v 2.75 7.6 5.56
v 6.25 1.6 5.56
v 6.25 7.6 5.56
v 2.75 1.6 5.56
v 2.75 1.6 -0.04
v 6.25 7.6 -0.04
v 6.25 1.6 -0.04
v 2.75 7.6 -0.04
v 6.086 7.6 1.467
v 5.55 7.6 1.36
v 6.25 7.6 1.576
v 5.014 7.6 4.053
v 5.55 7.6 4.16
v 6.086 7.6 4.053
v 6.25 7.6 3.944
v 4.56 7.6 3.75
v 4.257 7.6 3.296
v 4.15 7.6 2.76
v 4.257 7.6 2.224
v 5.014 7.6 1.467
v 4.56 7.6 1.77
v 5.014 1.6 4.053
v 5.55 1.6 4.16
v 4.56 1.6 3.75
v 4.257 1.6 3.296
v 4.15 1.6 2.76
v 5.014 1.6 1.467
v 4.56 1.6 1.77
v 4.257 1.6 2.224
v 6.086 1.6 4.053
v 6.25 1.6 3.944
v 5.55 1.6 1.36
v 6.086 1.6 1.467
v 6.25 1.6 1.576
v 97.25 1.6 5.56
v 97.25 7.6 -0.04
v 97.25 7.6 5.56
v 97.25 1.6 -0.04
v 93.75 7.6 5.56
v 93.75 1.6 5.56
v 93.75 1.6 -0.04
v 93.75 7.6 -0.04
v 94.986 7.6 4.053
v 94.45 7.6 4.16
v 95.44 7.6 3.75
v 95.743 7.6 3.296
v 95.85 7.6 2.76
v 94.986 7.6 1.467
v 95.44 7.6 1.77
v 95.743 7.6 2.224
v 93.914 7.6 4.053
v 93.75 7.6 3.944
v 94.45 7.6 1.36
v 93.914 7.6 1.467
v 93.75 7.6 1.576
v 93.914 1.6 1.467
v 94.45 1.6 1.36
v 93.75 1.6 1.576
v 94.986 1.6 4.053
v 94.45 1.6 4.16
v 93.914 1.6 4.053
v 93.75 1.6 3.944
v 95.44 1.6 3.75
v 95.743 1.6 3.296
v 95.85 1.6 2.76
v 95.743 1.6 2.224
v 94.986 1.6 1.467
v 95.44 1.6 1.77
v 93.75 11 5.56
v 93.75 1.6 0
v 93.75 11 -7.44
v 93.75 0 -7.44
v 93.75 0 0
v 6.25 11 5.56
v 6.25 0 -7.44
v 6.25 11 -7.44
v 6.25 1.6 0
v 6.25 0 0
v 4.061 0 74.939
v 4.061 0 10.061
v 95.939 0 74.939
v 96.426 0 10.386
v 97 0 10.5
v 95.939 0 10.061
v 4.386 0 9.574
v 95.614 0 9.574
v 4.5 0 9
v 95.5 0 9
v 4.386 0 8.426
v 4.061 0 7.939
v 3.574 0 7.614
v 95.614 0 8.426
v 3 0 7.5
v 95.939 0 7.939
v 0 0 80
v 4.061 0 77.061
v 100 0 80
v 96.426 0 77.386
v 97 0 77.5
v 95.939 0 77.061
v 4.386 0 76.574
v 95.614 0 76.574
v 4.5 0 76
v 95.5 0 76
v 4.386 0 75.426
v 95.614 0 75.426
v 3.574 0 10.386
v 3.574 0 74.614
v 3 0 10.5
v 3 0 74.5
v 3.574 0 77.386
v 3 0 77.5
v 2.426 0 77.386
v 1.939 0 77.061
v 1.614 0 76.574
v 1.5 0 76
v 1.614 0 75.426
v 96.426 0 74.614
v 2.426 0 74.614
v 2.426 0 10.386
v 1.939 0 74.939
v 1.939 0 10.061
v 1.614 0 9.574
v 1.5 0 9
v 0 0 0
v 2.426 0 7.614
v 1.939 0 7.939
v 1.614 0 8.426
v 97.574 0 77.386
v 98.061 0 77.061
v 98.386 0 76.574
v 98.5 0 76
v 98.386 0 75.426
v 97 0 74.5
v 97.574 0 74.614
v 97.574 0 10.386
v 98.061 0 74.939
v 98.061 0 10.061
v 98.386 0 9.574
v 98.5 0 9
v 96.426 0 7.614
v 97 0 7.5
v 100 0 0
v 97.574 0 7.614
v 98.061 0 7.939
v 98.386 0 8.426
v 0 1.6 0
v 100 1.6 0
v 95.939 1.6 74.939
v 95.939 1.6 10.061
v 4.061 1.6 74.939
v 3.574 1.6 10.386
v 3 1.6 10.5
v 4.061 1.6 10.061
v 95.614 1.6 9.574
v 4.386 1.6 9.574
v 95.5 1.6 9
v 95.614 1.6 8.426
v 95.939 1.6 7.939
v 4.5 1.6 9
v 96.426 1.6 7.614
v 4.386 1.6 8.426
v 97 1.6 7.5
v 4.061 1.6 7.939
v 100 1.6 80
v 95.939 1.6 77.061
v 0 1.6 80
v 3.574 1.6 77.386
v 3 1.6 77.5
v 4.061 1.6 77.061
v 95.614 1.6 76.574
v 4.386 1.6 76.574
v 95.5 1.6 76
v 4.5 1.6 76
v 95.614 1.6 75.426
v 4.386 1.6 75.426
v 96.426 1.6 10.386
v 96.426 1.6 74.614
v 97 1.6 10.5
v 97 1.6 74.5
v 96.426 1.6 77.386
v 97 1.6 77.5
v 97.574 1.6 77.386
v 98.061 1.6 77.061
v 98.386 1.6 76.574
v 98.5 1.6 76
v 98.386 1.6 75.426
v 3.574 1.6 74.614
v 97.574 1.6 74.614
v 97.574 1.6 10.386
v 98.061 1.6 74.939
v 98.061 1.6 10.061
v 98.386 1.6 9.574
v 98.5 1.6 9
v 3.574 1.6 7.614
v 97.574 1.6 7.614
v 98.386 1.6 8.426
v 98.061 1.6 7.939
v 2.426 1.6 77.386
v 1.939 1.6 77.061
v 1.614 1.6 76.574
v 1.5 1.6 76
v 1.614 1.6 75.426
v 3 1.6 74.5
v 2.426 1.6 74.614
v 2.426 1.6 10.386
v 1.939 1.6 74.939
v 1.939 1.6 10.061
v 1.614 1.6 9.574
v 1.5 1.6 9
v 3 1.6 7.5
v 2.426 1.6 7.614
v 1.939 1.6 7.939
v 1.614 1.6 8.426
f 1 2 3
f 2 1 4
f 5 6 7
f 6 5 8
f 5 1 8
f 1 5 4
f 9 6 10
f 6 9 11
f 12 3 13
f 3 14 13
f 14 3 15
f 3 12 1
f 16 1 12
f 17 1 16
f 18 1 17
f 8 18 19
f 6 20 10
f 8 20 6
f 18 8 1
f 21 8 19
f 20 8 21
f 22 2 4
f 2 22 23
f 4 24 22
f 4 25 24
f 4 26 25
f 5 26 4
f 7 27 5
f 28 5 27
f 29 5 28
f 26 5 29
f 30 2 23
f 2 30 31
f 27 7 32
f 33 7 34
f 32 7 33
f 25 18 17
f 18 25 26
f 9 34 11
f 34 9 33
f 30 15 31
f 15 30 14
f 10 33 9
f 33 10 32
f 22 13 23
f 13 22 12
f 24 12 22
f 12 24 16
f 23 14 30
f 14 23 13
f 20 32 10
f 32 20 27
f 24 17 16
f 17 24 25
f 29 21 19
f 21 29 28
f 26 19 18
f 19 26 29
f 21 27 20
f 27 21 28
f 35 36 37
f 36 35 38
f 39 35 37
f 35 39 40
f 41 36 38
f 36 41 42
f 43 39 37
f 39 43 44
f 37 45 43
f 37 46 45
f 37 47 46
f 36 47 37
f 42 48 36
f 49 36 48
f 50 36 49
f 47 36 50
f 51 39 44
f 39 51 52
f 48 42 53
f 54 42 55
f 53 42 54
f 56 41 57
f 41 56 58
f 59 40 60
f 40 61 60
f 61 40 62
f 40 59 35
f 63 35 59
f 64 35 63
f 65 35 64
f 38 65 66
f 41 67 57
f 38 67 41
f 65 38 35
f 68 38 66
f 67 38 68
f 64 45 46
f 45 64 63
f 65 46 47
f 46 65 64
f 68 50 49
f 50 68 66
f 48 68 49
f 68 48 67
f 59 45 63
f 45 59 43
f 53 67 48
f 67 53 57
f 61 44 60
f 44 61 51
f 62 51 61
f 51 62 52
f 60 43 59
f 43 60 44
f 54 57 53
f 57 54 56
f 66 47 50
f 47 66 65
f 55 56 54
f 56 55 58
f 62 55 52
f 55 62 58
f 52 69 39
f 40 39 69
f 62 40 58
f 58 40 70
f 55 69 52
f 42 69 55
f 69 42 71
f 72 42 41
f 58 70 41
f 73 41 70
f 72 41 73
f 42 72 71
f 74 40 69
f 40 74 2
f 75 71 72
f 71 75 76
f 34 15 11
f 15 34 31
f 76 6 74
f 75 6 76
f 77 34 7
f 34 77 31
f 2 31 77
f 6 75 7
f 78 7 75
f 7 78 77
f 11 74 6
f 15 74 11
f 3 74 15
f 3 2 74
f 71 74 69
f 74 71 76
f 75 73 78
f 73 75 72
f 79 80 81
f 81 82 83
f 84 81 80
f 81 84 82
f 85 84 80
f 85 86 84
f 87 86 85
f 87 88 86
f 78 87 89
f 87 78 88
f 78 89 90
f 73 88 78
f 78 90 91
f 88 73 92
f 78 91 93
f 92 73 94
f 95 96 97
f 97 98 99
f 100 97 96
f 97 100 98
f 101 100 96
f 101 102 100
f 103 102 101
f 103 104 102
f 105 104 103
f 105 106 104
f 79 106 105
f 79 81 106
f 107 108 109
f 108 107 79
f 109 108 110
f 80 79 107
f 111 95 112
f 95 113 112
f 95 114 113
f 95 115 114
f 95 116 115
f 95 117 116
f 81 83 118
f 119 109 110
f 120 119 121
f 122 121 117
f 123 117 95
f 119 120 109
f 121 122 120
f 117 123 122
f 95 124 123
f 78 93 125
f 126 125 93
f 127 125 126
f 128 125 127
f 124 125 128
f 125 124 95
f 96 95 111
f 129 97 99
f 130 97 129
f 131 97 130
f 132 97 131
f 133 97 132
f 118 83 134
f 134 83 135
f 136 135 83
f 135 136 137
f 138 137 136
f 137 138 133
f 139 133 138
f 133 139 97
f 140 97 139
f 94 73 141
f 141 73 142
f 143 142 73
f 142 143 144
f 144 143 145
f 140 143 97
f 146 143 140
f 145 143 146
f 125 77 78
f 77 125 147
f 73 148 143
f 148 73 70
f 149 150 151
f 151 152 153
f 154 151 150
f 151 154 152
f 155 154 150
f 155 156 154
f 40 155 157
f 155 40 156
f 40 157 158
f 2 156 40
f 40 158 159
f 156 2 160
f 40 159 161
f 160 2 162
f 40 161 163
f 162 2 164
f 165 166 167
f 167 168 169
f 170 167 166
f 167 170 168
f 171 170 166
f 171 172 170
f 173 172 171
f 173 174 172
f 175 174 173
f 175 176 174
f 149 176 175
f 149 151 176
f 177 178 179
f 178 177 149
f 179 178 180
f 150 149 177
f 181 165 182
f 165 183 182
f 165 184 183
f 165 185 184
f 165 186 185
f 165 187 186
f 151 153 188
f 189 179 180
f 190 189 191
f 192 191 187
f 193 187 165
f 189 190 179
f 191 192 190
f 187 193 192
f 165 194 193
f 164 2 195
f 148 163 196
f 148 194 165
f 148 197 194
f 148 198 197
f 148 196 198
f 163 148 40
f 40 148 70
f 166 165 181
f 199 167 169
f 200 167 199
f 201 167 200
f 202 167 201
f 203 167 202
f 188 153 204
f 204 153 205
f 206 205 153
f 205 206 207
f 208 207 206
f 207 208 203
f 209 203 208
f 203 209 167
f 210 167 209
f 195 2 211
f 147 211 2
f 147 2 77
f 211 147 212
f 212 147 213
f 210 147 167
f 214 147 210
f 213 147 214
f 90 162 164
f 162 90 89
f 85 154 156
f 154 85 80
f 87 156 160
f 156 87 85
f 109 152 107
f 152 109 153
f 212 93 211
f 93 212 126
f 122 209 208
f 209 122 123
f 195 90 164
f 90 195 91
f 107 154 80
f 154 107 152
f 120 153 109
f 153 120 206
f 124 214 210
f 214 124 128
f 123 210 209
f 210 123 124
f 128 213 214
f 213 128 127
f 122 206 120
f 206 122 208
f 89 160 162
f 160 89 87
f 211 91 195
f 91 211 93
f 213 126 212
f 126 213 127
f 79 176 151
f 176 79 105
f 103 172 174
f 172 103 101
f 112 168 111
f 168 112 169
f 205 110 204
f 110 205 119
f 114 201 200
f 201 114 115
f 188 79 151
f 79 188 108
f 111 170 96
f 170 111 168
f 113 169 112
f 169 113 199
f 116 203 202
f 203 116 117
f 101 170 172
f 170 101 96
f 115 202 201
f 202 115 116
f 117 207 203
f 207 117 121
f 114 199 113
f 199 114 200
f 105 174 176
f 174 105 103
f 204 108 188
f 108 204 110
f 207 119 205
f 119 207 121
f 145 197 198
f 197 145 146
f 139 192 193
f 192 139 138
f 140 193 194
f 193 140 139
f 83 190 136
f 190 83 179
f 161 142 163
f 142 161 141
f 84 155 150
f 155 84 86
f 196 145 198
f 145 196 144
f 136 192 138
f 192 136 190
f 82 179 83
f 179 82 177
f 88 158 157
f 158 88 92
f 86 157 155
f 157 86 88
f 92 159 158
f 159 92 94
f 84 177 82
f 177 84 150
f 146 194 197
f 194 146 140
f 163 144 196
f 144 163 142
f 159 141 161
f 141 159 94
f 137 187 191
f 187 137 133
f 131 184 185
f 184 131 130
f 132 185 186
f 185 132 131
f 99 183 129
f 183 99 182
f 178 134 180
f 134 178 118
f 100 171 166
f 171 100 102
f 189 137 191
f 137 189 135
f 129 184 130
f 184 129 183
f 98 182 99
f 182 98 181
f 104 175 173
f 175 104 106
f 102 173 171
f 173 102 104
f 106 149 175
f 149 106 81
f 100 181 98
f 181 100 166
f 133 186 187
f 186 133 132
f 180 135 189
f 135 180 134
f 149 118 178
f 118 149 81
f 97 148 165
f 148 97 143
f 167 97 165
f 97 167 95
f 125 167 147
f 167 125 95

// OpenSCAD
// file: ../library/linurs_screw_dim.scad
// Metric screws and nuts 
// urs@linurs.org 2015

// contains dimensions of linurs_screw and can be included in other 
// OpenScad files 


// Consistent parameters in this file
// d screw diameter M2_5, M3, ... (enumeration with screw_d)
// t millimeters added to diameters 
//   For the screw, head, nut = 0. 
//   For the piece where the screw, nut, ... passes through = 0.5 so it slides in well

// enumerations of metric threads
M2_5=0;
M3=1;
M4=2;
M5=3;

// enumerations screw head type
head_cyl=0; // cylinder
head_cnt=1; // countrsunk
head_no=2;  // no head at all
head_hex=3;  // no head at all

// screw diameters
screw_d=[
2.5, // M2.5
3.0, // M3
4.0, // M4
5.0  // M5
];

// sizes for hex nuts
screw_hex=[
//   s,   e,   h
 [ 5.0, 5.8, 1.7], // M2.5
 [ 5.5, 6.4, 2.0], // M3
 [ 7.0, 8.1, 2.8], // M4
 [ 8.0, 9.2, 3.5]  // M5
];

// sizes for cylinder screw heads
screw_cyl=[
//   d,   h
 [ 4.5, 1.6], // M2.5
 [ 5.5, 2.0], // M3
 [ 7.0, 2.6], // M4
 [ 8.5, 3.3]  // M5
];

// sizes for countersunk screw heads
screw_cnt=[
//   d,   h
 [ 4.7, 1.50], // M2.5
 [ 5.6, 1.65], // M3
 [ 7.4, 2.20], // M4
 [ 9.2, 2.50]  // M5
];
// file: pcb.scad
// pcb
// pcb of the module
// This module is not intended to be 3D printed

include <../motherboard/motherboard_dim.scad>
include <pcbmodule_dim.scad>


module pcb(){
  echo("pcb");  
  color("greenyellow")
  difference(){
    cube([motherboard_w,pcb_thick,pcb_h]); // pcb
    for(x=[pcb_x1,pcb_x2]){ // mounting holes
      for(y=[pcb_y1,pcb_y2]){
        translate([x,0,y])
        rotate([90,0,0])
        cylinder(d=pcb_d,h=3*pcb_thick,center=true,$fn=16);
      }
    }
  }
}

//
pcb();
// file: ../motherboard/motherboard_dim.scad
// motherboard pcb dimensions
motherboard_w=100;   // pcb width
motherboard_t=1.6;   // pcb thickness
motherboard_pass=0.5;// gap to fit screws 
step=25.4;           // distance between modules

// connector dimensions
motherboard_con_head_w=85;  // width of the connector head
motherboard_con_head_d=8.5; // depth of the connector head
motherboard_con_w=95;       // largest width of the connector
motherboard_con_h=11.6;     // largest height of the connector
motherboard_con_t=11;       // largest depth of the connector
motherboard_con_d_w=90;     // distance between mounting holes
motherboard_con_d=2.8;      // diameter of mounting holes
motherboard_con_out=5.2;    // height produced by the connector when pulgged in 

// pcb module connector dimension
pcbmodule_con_out=13-(5.3+2.8-2.54);  // distance connector sticks out of pcb

// offset
motherboard_z_offset= -(pcbmodule_con_out+motherboard_con_out+motherboard_t); // z offset motherboard built in
// file: pcbmodule_dim.scad
include <../library/linurs_screw_dim.scad>
include <../motherboard/motherboard_dim.scad>
// pcb constants
pcb_h=80;              // height of the pcb
pcb_thick=1.6;         // thickness
pcb_x1=3;              // position mounting holes
pcb_x2=97;
pcb_y1=9;
pcb_y2=76;
pcb_d=3;               // diameter of holes

// bracket constants
bracket_t=2;           // thickness of bracket
bracket_x1=10;         // depth of the U shape at the side of the screw
bracket_x2=4;          // depth of the U shape at the side where no screw is  
bracket_h=pcb_h+15;    // height of bracket
bracket_hole_cube_h=4; // height of the mounting hole cube
bracket_screw=M2_5;    // hole for the screw

// bracket offsets
bracket_offset_x=-3;   // bracket offset in elecbox x axis (adding gap)
bracket_offset_z=-10;  // bracket offset in elecbox z axis

// pcb module dimensions
pcbmodule_w=(-bracket_offset_x)*2+motherboard_w; // depth of the module
pcbmodule_h=bracket_h;                           // hight of the module   
pcbmodule_l=step;                                // width of the module   

screw_t=1; //mm added so screws fit into holes
olp=0.1; // overlapp distance to produce nice body after difference() 
// main file
// connector
// Connector to be mounted on pcb of the modules
// This module is not intended to be 3D printed
include <pcbmodule_dim.scad>
include <../motherboard/motherboard_dim.scad>

use <pcb.scad>

con_w=87.5;   // width of connector bodywithout flanges of mounting holes 
con_d=2.8;    // diameter of mounting holes
con_d_w=88.9; // distance between mounting holes
con_m_h=6;    // height of mounting cube
con_h=13;     // largest z dimension

module connector(){
  echo("pcb connector");
  color("LightGrey")
  difference(){
    translate([(motherboard_w-con_w)/2,0,-pcbmodule_con_out]) // bring in position of elecbox
    union(){
      cube([con_w,motherboard_con_t,con_h]); // main body of the connector
      for(x=[(con_w-con_d_w)/2,con_w+(con_d_w-con_w)/2]){ // add the two brackets
        translate([x,con_m_h/2+pcb_thick,10.2])
        difference(){
          cube([2*con_d,con_m_h,2*con_d],center=true);  // bracket main body
          rotate([90,0,0])
          cylinder(d=con_d, h=con_h, $fn=16, center=true); // hole in brackets
        }
      }
    }
    translate([0,-olp,0])cube([motherboard_w,motherboard_t+olp,2*con_d]); // remove material to create edge of pcb
  }
}
connector();

//
pcb();
